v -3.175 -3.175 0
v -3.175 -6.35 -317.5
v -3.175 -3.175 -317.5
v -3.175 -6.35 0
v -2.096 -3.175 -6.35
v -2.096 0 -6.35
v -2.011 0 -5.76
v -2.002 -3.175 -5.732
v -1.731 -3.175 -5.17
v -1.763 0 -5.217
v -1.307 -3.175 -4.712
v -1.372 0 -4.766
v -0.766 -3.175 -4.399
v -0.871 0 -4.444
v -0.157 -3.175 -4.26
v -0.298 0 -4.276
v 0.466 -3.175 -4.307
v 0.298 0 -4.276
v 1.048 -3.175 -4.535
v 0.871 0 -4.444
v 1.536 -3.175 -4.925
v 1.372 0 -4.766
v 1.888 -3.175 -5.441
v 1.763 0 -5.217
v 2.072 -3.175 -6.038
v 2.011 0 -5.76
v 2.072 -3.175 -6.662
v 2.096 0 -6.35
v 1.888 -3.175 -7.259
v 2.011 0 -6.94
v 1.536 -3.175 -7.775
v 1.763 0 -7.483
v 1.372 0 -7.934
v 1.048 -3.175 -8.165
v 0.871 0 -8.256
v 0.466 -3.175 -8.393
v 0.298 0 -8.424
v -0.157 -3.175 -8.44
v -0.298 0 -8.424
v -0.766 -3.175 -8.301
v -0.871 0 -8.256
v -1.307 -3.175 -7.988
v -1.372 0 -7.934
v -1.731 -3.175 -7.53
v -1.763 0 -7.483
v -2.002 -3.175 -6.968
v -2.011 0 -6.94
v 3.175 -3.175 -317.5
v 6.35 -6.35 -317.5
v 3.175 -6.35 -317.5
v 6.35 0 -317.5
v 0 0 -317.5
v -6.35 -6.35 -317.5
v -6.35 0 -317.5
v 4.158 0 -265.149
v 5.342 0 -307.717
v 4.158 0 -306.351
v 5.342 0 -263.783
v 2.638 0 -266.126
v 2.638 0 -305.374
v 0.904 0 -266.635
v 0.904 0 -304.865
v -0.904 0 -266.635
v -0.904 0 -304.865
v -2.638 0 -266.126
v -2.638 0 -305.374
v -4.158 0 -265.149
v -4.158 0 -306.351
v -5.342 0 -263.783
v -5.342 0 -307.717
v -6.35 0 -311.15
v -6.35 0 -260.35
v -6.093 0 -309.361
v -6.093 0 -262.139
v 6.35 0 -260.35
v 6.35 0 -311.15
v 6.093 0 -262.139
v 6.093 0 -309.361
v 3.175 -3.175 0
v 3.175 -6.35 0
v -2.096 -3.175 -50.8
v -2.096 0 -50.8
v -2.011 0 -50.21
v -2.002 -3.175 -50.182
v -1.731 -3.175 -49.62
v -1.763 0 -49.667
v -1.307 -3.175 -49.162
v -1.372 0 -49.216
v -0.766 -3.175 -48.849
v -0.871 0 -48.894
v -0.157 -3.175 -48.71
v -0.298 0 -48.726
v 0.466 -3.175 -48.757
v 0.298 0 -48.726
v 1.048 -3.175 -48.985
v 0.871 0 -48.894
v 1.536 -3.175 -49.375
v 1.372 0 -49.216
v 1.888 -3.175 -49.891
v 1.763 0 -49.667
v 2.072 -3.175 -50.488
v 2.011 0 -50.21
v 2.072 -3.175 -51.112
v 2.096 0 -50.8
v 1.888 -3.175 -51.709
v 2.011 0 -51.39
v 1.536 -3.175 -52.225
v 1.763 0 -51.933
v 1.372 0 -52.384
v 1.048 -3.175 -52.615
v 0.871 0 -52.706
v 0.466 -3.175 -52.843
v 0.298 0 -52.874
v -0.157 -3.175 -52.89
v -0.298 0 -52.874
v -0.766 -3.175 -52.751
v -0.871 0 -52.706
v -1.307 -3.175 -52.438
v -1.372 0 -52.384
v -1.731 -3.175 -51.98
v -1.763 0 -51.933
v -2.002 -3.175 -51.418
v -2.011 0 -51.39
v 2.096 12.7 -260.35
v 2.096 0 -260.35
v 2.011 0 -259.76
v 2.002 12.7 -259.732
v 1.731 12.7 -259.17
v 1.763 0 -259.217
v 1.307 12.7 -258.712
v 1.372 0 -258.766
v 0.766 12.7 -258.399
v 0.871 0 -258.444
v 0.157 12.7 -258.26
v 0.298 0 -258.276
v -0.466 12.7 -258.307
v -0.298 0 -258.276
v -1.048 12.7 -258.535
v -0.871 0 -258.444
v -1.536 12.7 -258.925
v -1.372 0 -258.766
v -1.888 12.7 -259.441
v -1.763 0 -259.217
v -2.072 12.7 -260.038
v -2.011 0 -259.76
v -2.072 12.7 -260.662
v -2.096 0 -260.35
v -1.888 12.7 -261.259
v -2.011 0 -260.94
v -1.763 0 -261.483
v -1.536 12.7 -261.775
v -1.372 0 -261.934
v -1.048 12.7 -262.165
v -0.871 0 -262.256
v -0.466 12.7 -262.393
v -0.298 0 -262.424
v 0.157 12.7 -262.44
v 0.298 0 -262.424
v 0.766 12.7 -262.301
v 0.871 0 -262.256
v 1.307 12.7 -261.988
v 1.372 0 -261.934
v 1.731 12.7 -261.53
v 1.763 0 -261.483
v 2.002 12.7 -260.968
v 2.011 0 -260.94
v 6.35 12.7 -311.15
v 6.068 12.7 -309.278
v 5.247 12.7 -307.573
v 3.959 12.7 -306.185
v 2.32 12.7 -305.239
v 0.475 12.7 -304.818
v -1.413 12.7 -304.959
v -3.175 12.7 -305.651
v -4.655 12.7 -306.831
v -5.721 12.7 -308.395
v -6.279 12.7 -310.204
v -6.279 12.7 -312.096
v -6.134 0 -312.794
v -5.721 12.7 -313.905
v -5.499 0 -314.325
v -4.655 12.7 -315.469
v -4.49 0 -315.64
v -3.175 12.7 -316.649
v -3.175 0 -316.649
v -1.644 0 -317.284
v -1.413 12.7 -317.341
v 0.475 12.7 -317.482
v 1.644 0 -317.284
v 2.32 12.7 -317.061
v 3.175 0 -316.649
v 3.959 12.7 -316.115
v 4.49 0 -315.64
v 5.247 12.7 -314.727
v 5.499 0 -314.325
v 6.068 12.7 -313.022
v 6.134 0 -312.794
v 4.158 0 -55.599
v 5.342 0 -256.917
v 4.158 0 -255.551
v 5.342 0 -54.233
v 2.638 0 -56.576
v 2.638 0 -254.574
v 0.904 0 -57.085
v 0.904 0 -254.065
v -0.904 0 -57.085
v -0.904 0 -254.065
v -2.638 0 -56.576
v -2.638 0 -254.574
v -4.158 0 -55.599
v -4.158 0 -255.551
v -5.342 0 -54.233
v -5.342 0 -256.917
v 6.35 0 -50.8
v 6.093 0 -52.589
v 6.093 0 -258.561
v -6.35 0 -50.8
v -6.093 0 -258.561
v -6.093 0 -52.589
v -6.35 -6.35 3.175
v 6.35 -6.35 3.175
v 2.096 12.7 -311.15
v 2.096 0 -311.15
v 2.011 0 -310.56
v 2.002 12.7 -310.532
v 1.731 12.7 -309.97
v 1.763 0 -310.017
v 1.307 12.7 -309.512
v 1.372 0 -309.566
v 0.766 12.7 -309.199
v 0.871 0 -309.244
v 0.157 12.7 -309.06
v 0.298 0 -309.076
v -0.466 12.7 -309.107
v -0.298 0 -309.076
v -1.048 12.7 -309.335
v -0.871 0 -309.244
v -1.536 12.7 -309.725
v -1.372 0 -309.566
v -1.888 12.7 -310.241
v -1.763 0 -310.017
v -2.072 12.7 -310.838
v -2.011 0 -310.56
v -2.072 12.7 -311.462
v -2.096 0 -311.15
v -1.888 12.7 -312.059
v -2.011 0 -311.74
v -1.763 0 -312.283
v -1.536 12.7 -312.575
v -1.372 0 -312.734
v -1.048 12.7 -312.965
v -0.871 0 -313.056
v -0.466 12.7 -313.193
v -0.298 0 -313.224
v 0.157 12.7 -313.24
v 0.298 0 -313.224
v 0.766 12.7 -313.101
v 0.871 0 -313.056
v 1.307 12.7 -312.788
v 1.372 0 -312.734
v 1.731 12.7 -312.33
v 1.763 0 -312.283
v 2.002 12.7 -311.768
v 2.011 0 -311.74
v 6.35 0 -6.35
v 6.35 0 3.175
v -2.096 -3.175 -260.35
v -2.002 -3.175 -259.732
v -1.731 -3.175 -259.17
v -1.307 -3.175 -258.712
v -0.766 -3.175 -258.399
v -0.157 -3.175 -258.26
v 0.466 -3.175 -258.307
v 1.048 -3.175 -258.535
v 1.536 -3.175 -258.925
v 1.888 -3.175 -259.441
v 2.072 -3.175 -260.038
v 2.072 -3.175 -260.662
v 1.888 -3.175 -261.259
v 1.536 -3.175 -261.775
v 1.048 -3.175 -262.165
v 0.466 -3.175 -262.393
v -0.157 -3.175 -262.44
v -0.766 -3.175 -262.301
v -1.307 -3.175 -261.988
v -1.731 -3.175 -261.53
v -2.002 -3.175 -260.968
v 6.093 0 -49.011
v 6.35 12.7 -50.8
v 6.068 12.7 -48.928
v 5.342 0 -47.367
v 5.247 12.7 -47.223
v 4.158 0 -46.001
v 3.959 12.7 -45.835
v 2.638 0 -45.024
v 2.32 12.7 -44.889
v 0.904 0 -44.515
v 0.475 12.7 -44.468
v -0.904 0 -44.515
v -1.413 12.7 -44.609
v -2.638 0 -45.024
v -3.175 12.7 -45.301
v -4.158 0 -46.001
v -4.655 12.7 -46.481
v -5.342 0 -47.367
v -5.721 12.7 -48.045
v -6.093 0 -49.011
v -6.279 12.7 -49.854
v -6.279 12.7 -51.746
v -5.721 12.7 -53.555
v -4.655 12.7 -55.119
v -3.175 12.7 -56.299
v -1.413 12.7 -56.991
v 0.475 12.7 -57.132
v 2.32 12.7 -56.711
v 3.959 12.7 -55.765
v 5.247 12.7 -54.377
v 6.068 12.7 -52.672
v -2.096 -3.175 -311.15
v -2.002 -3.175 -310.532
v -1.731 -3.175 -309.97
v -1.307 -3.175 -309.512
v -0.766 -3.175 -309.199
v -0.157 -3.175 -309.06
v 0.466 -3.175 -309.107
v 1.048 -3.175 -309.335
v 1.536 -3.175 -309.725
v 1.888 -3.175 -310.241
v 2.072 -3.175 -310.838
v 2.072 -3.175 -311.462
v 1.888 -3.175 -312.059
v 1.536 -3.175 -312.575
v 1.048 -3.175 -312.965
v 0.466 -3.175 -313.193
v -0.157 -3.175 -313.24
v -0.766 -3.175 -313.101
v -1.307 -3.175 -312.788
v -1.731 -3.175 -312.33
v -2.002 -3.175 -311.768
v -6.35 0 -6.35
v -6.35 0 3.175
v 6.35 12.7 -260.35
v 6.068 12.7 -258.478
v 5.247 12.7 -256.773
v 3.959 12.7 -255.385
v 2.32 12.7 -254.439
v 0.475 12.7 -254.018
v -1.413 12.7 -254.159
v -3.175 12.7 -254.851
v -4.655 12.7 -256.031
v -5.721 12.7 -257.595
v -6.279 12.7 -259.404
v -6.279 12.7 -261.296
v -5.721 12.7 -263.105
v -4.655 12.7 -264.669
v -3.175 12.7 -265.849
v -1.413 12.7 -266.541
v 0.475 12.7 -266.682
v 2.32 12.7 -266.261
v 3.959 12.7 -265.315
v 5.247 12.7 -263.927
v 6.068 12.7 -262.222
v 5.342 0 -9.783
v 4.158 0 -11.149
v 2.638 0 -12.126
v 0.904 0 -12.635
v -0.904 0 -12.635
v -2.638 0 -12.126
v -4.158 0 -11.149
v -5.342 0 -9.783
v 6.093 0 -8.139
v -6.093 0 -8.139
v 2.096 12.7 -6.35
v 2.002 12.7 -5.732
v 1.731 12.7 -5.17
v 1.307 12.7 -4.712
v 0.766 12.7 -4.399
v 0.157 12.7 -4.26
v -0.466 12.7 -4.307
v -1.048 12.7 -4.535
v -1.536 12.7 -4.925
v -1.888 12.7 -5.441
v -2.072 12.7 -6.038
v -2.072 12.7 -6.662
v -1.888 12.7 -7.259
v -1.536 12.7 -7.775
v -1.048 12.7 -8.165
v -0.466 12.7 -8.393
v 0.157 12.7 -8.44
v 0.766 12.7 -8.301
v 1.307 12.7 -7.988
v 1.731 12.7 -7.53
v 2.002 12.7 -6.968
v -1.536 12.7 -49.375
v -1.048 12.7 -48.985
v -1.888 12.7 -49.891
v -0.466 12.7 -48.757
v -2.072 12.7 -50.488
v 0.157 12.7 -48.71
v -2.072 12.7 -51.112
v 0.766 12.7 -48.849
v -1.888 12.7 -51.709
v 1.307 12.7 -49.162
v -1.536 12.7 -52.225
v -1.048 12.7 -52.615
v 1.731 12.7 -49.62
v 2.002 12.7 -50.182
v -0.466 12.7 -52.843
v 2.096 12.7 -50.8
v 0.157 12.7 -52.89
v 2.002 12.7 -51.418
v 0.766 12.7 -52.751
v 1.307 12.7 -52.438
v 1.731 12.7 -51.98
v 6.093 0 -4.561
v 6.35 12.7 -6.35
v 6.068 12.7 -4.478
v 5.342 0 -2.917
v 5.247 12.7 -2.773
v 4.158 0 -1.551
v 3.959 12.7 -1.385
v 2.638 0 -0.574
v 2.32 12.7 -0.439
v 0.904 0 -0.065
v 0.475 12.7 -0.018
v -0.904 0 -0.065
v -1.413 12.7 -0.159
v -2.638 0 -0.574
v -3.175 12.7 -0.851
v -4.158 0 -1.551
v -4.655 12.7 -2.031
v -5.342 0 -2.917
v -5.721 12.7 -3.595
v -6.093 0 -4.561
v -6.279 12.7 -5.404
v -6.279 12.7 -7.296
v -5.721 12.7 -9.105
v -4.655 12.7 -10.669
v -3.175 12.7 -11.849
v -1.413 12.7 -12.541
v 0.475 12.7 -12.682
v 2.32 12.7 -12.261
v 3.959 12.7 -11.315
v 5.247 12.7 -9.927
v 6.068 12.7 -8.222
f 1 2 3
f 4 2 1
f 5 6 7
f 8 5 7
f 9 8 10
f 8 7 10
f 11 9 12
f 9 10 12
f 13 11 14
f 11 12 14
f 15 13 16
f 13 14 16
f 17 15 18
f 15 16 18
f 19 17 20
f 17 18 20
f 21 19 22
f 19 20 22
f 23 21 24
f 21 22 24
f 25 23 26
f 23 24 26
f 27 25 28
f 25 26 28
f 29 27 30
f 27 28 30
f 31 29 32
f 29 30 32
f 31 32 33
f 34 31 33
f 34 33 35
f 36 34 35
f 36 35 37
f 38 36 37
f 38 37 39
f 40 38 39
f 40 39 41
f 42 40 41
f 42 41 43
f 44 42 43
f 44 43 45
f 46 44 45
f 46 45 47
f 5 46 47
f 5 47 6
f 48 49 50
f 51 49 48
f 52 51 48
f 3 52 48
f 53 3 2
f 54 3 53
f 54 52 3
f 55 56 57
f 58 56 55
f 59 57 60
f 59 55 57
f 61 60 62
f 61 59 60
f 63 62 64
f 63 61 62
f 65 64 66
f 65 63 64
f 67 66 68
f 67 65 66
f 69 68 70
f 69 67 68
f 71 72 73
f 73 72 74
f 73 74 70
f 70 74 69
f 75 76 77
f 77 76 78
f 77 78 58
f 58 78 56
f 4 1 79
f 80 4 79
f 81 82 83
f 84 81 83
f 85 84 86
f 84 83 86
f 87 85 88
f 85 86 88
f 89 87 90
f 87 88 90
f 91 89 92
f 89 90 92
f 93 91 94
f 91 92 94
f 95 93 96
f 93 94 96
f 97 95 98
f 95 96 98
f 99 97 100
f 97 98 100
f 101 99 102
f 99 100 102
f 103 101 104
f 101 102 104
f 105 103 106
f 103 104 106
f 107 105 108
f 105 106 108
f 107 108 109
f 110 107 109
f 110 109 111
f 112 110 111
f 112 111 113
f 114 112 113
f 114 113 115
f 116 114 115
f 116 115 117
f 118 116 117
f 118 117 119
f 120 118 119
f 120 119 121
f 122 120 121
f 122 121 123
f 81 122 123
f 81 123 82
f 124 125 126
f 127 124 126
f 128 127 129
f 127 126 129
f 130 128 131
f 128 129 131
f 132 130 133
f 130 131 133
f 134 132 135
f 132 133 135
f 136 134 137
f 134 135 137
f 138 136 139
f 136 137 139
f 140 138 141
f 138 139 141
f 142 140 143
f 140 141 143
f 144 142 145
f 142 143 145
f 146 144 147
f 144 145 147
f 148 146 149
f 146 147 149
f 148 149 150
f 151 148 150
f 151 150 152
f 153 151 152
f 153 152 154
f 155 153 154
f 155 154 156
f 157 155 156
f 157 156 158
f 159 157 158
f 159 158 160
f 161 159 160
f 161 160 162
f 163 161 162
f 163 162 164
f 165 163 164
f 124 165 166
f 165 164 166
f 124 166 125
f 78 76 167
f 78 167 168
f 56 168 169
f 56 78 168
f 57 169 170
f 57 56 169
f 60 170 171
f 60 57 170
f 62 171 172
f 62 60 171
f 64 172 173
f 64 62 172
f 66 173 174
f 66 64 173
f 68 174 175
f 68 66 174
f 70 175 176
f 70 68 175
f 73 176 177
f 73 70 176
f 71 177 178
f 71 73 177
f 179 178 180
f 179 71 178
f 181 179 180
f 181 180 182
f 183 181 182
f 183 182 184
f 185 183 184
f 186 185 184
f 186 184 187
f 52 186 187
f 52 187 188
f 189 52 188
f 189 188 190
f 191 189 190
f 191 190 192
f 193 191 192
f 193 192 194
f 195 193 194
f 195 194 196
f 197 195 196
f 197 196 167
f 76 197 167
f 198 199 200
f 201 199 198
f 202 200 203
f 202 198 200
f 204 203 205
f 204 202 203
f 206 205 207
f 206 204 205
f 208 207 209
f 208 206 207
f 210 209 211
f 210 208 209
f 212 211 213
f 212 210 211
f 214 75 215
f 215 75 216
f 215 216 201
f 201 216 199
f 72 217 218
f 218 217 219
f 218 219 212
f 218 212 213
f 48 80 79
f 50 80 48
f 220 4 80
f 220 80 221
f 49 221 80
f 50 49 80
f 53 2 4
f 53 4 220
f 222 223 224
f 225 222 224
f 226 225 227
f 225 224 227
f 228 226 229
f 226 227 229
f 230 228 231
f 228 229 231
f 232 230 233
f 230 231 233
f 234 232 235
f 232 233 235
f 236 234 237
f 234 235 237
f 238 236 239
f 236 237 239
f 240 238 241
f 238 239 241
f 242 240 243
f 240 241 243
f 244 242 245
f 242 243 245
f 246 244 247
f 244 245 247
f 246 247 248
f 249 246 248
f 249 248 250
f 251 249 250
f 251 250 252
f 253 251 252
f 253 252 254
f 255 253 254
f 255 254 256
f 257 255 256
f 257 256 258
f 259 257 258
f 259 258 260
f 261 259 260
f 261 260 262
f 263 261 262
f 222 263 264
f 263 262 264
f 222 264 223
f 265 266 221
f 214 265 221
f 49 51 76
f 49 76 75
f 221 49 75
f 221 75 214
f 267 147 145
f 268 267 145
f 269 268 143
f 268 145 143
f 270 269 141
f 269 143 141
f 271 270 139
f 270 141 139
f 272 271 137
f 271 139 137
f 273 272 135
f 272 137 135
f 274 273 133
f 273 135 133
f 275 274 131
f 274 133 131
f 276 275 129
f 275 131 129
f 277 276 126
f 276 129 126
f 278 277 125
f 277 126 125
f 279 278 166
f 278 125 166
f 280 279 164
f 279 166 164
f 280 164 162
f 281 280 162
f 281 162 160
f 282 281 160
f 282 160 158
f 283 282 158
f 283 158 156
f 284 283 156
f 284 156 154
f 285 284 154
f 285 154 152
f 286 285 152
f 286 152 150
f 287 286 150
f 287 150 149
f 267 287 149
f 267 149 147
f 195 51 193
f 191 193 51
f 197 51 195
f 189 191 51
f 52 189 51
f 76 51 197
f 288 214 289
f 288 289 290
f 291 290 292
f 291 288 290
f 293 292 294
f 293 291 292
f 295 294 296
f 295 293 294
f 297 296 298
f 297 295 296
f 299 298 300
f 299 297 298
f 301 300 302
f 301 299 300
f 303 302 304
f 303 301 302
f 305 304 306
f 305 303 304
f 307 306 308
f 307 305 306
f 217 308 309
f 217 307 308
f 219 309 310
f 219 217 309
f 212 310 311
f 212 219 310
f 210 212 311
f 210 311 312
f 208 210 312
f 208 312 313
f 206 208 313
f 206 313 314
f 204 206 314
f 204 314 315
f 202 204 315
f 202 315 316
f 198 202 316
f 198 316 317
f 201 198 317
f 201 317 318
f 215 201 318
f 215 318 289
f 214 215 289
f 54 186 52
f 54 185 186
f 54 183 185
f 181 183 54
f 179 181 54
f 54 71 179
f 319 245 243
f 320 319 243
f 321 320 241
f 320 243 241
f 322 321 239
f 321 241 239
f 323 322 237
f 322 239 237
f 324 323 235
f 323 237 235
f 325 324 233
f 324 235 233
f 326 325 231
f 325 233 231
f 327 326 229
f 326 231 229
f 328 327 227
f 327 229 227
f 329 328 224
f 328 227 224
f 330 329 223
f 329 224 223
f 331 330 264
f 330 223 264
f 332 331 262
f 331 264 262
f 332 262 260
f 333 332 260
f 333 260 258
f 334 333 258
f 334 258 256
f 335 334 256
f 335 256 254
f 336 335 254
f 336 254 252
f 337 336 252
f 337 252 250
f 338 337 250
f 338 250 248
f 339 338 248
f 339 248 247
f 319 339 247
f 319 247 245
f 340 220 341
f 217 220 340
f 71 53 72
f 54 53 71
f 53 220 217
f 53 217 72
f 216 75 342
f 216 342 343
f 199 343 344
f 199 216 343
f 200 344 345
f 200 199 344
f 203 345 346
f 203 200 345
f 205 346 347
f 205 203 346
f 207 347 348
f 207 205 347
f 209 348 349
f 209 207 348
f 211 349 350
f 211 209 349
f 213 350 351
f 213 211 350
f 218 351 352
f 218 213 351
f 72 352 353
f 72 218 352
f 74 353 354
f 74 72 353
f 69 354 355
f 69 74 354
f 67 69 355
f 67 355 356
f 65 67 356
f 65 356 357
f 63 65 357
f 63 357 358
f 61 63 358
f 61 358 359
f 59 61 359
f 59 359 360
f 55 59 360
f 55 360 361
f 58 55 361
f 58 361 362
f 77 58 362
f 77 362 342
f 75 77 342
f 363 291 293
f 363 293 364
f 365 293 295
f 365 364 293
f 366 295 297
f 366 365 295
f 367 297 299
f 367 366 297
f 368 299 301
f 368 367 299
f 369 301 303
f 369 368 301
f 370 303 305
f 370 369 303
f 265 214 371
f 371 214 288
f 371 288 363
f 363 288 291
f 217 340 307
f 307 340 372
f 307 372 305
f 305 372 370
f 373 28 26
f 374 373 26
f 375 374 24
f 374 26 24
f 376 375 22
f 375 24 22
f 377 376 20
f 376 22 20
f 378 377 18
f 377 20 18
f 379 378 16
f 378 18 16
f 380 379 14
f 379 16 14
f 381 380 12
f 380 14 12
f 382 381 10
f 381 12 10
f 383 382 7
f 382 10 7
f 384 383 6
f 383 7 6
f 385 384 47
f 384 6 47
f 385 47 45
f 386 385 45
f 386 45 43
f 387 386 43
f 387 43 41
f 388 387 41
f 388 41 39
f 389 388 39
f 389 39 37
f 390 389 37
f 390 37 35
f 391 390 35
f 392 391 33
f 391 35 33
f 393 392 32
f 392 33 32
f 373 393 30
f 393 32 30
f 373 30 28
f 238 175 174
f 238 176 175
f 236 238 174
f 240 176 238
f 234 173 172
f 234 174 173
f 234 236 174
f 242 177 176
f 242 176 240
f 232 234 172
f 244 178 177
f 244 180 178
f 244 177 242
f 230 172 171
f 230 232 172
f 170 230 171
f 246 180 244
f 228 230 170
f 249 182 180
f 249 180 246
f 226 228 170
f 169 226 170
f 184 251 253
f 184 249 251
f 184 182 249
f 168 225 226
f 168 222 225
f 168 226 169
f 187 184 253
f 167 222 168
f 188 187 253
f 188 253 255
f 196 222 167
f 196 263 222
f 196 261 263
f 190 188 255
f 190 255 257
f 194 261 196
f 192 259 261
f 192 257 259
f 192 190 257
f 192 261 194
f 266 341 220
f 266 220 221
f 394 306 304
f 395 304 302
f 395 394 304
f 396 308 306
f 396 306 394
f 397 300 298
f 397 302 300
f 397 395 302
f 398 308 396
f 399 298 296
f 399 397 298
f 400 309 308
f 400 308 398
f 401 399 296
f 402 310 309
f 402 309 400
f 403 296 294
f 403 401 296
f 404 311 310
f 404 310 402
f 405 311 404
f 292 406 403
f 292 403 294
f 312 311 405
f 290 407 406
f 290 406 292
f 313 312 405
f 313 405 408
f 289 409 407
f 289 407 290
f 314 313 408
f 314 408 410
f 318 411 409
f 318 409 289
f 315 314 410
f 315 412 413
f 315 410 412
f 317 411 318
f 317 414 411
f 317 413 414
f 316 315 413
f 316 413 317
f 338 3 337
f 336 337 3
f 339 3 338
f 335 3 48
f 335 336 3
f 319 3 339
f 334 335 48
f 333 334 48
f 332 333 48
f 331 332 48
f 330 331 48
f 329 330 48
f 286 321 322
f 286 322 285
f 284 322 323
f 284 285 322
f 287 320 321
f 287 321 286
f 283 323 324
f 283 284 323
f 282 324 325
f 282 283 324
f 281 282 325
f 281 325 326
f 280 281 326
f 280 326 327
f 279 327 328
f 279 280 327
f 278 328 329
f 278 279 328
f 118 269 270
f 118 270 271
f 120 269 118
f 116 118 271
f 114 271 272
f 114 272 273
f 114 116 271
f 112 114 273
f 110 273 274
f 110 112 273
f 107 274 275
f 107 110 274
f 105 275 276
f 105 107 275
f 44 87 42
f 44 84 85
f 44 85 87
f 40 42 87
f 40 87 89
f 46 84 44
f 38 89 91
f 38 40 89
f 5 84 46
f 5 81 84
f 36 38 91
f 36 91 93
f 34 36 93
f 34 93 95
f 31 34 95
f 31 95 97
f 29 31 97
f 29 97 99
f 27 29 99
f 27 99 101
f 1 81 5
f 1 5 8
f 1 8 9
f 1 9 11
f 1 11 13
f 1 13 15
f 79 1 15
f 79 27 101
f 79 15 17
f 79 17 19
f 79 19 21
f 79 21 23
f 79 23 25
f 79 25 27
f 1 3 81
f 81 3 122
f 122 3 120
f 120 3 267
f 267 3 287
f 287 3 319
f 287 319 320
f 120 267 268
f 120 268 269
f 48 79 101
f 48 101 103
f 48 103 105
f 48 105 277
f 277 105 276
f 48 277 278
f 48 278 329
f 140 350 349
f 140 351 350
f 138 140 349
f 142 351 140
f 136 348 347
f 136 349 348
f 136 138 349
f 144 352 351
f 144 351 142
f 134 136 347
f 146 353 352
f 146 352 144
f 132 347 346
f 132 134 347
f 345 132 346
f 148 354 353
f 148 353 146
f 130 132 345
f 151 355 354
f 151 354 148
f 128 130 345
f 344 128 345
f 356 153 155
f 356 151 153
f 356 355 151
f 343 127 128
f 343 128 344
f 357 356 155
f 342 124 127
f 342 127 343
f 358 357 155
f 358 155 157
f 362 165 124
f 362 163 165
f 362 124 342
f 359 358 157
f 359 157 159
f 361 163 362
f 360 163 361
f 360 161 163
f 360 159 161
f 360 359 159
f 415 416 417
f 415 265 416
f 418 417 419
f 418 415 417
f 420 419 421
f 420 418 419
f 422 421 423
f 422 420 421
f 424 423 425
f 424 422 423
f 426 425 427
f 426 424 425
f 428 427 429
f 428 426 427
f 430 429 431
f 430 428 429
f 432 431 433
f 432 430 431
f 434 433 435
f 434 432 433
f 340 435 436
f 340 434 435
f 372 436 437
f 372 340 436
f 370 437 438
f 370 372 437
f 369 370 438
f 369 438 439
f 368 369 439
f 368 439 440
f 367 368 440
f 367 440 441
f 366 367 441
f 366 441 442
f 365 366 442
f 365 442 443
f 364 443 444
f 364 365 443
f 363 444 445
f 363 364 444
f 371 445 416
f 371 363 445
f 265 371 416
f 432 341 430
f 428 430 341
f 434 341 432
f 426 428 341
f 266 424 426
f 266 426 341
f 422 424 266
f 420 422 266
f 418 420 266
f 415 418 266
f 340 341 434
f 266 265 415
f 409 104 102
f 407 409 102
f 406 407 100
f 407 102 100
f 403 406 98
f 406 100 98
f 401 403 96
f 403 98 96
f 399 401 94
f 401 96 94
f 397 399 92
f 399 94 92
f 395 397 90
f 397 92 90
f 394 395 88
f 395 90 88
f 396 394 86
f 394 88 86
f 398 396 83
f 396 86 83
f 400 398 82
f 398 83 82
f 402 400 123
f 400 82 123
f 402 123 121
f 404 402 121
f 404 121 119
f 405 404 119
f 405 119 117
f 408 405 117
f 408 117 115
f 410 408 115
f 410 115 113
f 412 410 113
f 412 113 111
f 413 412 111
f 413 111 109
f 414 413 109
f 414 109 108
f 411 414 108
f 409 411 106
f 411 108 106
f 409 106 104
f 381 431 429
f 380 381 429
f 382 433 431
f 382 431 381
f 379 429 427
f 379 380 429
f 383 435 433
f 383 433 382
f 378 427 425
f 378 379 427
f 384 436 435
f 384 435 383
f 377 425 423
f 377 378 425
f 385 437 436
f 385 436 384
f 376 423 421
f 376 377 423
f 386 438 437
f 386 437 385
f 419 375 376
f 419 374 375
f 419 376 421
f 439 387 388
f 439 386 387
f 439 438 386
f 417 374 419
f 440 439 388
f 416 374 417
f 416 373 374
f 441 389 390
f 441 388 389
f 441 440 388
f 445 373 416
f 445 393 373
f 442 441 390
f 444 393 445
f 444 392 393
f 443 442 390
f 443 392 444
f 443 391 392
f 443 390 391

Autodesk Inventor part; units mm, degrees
ref_plane "YZ Plane" through (0, 0, 0) normal (1, 0, 0) x (0, 1, 0)
ref_plane "XZ Plane" through (0, 0, 0) normal (0, 1, 0) x (-1, 0, 0)
ref_plane "XY Plane" through (0, 0, 0) normal (0, 0, 1) x (1, 0, 0)
sketch "Sketch1" plane through (0, 0, 0) normal (0, 1, 0) x (-1, 0, 0)
  line L0 (6.35, 0) -> (-6.35, 0)
  line L1 (-6.35, 0) -> (-6.35, -317.5)
  line L2 (-6.35, -317.5) -> (6.35, -317.5)
  line L3 (6.35, -317.5) -> (6.35, 0)
  circle A0 centre (0, -6.35) radius 2.0955
  circle A1 centre (0, -311.15) radius 2.0955
  circle A2 centre (0, -50.8) radius 2.0955
  circle A3 centre (0, -260.35) radius 2.0955
  point P0 (0, 0)
  dimension "d0" = 12.7
  dimension "d1" = 317.5
  dimension "d2" = 4.191
extrude "Extrusion1" add sketch "Sketch1" against normal blind 6.35
sketch "Sketch2" plane through (0, -6.35, 0) normal (0, -1, 0) x (1, 0, 0)
  line L0 (6.35, 0) -> (-6.35, 0) projected
  line L1 (-3.175, 0) -> (3.175, 0)
  line L2 (3.175, 0) -> (3.175, -317.5)
  line L3 (3.175, -317.5) -> (-3.175, -317.5)
  line L4 (-3.175, -317.5) -> (-3.175, 0)
  point P0 (0, 0)
extrude "Extrusion2" cut sketch "Sketch2" against normal blind 3.175
sketch "Sketch3" plane through (0, 0, 0) normal (0, 1, 0) x (1, 0, 0)
  circle A0 centre (0, 6.35) radius 6.35
  circle A1 centre (0, 50.8) radius 6.35
  line L0 (-6.35, 317.5) -> (-6.35, 0) projected
  circle A2 centre (0, 260.35) radius 6.35
  circle A3 centre (0, 311.15) radius 6.35
  circle A4 centre (0, 50.8) radius 2.0955 projected
  circle A5 centre (0, 6.35) radius 2.0955 projected
  circle A6 centre (0, 260.35) radius 2.0955 projected
  circle A7 centre (0, 311.15) radius 2.0955 projected
  point P0 (0, 0)
extrude "Extrusion3" add sketch "Sketch3" along normal blind 12.7
sketch "Sketch4" plane through (6.35, -6.35, 0) normal (0, 0, 1) x (1, 0, 0)
  line L0 (0, 6.35) -> (0, 0) projected
  line L1 (0, 0) -> (-12.7, 0)
  line L2 (-12.7, 0) -> (-12.7, 6.35)
  line L3 (-12.7, 6.35) -> (0, 6.35)
  line L4 (0, 6.35) -> (0, 0)
  point P0 (-6.35, 6.35)
extrude "Extrusion4" add sketch "Sketch4" along normal blind 3.175
properties part number "HS MOGO Ramp Jig"
